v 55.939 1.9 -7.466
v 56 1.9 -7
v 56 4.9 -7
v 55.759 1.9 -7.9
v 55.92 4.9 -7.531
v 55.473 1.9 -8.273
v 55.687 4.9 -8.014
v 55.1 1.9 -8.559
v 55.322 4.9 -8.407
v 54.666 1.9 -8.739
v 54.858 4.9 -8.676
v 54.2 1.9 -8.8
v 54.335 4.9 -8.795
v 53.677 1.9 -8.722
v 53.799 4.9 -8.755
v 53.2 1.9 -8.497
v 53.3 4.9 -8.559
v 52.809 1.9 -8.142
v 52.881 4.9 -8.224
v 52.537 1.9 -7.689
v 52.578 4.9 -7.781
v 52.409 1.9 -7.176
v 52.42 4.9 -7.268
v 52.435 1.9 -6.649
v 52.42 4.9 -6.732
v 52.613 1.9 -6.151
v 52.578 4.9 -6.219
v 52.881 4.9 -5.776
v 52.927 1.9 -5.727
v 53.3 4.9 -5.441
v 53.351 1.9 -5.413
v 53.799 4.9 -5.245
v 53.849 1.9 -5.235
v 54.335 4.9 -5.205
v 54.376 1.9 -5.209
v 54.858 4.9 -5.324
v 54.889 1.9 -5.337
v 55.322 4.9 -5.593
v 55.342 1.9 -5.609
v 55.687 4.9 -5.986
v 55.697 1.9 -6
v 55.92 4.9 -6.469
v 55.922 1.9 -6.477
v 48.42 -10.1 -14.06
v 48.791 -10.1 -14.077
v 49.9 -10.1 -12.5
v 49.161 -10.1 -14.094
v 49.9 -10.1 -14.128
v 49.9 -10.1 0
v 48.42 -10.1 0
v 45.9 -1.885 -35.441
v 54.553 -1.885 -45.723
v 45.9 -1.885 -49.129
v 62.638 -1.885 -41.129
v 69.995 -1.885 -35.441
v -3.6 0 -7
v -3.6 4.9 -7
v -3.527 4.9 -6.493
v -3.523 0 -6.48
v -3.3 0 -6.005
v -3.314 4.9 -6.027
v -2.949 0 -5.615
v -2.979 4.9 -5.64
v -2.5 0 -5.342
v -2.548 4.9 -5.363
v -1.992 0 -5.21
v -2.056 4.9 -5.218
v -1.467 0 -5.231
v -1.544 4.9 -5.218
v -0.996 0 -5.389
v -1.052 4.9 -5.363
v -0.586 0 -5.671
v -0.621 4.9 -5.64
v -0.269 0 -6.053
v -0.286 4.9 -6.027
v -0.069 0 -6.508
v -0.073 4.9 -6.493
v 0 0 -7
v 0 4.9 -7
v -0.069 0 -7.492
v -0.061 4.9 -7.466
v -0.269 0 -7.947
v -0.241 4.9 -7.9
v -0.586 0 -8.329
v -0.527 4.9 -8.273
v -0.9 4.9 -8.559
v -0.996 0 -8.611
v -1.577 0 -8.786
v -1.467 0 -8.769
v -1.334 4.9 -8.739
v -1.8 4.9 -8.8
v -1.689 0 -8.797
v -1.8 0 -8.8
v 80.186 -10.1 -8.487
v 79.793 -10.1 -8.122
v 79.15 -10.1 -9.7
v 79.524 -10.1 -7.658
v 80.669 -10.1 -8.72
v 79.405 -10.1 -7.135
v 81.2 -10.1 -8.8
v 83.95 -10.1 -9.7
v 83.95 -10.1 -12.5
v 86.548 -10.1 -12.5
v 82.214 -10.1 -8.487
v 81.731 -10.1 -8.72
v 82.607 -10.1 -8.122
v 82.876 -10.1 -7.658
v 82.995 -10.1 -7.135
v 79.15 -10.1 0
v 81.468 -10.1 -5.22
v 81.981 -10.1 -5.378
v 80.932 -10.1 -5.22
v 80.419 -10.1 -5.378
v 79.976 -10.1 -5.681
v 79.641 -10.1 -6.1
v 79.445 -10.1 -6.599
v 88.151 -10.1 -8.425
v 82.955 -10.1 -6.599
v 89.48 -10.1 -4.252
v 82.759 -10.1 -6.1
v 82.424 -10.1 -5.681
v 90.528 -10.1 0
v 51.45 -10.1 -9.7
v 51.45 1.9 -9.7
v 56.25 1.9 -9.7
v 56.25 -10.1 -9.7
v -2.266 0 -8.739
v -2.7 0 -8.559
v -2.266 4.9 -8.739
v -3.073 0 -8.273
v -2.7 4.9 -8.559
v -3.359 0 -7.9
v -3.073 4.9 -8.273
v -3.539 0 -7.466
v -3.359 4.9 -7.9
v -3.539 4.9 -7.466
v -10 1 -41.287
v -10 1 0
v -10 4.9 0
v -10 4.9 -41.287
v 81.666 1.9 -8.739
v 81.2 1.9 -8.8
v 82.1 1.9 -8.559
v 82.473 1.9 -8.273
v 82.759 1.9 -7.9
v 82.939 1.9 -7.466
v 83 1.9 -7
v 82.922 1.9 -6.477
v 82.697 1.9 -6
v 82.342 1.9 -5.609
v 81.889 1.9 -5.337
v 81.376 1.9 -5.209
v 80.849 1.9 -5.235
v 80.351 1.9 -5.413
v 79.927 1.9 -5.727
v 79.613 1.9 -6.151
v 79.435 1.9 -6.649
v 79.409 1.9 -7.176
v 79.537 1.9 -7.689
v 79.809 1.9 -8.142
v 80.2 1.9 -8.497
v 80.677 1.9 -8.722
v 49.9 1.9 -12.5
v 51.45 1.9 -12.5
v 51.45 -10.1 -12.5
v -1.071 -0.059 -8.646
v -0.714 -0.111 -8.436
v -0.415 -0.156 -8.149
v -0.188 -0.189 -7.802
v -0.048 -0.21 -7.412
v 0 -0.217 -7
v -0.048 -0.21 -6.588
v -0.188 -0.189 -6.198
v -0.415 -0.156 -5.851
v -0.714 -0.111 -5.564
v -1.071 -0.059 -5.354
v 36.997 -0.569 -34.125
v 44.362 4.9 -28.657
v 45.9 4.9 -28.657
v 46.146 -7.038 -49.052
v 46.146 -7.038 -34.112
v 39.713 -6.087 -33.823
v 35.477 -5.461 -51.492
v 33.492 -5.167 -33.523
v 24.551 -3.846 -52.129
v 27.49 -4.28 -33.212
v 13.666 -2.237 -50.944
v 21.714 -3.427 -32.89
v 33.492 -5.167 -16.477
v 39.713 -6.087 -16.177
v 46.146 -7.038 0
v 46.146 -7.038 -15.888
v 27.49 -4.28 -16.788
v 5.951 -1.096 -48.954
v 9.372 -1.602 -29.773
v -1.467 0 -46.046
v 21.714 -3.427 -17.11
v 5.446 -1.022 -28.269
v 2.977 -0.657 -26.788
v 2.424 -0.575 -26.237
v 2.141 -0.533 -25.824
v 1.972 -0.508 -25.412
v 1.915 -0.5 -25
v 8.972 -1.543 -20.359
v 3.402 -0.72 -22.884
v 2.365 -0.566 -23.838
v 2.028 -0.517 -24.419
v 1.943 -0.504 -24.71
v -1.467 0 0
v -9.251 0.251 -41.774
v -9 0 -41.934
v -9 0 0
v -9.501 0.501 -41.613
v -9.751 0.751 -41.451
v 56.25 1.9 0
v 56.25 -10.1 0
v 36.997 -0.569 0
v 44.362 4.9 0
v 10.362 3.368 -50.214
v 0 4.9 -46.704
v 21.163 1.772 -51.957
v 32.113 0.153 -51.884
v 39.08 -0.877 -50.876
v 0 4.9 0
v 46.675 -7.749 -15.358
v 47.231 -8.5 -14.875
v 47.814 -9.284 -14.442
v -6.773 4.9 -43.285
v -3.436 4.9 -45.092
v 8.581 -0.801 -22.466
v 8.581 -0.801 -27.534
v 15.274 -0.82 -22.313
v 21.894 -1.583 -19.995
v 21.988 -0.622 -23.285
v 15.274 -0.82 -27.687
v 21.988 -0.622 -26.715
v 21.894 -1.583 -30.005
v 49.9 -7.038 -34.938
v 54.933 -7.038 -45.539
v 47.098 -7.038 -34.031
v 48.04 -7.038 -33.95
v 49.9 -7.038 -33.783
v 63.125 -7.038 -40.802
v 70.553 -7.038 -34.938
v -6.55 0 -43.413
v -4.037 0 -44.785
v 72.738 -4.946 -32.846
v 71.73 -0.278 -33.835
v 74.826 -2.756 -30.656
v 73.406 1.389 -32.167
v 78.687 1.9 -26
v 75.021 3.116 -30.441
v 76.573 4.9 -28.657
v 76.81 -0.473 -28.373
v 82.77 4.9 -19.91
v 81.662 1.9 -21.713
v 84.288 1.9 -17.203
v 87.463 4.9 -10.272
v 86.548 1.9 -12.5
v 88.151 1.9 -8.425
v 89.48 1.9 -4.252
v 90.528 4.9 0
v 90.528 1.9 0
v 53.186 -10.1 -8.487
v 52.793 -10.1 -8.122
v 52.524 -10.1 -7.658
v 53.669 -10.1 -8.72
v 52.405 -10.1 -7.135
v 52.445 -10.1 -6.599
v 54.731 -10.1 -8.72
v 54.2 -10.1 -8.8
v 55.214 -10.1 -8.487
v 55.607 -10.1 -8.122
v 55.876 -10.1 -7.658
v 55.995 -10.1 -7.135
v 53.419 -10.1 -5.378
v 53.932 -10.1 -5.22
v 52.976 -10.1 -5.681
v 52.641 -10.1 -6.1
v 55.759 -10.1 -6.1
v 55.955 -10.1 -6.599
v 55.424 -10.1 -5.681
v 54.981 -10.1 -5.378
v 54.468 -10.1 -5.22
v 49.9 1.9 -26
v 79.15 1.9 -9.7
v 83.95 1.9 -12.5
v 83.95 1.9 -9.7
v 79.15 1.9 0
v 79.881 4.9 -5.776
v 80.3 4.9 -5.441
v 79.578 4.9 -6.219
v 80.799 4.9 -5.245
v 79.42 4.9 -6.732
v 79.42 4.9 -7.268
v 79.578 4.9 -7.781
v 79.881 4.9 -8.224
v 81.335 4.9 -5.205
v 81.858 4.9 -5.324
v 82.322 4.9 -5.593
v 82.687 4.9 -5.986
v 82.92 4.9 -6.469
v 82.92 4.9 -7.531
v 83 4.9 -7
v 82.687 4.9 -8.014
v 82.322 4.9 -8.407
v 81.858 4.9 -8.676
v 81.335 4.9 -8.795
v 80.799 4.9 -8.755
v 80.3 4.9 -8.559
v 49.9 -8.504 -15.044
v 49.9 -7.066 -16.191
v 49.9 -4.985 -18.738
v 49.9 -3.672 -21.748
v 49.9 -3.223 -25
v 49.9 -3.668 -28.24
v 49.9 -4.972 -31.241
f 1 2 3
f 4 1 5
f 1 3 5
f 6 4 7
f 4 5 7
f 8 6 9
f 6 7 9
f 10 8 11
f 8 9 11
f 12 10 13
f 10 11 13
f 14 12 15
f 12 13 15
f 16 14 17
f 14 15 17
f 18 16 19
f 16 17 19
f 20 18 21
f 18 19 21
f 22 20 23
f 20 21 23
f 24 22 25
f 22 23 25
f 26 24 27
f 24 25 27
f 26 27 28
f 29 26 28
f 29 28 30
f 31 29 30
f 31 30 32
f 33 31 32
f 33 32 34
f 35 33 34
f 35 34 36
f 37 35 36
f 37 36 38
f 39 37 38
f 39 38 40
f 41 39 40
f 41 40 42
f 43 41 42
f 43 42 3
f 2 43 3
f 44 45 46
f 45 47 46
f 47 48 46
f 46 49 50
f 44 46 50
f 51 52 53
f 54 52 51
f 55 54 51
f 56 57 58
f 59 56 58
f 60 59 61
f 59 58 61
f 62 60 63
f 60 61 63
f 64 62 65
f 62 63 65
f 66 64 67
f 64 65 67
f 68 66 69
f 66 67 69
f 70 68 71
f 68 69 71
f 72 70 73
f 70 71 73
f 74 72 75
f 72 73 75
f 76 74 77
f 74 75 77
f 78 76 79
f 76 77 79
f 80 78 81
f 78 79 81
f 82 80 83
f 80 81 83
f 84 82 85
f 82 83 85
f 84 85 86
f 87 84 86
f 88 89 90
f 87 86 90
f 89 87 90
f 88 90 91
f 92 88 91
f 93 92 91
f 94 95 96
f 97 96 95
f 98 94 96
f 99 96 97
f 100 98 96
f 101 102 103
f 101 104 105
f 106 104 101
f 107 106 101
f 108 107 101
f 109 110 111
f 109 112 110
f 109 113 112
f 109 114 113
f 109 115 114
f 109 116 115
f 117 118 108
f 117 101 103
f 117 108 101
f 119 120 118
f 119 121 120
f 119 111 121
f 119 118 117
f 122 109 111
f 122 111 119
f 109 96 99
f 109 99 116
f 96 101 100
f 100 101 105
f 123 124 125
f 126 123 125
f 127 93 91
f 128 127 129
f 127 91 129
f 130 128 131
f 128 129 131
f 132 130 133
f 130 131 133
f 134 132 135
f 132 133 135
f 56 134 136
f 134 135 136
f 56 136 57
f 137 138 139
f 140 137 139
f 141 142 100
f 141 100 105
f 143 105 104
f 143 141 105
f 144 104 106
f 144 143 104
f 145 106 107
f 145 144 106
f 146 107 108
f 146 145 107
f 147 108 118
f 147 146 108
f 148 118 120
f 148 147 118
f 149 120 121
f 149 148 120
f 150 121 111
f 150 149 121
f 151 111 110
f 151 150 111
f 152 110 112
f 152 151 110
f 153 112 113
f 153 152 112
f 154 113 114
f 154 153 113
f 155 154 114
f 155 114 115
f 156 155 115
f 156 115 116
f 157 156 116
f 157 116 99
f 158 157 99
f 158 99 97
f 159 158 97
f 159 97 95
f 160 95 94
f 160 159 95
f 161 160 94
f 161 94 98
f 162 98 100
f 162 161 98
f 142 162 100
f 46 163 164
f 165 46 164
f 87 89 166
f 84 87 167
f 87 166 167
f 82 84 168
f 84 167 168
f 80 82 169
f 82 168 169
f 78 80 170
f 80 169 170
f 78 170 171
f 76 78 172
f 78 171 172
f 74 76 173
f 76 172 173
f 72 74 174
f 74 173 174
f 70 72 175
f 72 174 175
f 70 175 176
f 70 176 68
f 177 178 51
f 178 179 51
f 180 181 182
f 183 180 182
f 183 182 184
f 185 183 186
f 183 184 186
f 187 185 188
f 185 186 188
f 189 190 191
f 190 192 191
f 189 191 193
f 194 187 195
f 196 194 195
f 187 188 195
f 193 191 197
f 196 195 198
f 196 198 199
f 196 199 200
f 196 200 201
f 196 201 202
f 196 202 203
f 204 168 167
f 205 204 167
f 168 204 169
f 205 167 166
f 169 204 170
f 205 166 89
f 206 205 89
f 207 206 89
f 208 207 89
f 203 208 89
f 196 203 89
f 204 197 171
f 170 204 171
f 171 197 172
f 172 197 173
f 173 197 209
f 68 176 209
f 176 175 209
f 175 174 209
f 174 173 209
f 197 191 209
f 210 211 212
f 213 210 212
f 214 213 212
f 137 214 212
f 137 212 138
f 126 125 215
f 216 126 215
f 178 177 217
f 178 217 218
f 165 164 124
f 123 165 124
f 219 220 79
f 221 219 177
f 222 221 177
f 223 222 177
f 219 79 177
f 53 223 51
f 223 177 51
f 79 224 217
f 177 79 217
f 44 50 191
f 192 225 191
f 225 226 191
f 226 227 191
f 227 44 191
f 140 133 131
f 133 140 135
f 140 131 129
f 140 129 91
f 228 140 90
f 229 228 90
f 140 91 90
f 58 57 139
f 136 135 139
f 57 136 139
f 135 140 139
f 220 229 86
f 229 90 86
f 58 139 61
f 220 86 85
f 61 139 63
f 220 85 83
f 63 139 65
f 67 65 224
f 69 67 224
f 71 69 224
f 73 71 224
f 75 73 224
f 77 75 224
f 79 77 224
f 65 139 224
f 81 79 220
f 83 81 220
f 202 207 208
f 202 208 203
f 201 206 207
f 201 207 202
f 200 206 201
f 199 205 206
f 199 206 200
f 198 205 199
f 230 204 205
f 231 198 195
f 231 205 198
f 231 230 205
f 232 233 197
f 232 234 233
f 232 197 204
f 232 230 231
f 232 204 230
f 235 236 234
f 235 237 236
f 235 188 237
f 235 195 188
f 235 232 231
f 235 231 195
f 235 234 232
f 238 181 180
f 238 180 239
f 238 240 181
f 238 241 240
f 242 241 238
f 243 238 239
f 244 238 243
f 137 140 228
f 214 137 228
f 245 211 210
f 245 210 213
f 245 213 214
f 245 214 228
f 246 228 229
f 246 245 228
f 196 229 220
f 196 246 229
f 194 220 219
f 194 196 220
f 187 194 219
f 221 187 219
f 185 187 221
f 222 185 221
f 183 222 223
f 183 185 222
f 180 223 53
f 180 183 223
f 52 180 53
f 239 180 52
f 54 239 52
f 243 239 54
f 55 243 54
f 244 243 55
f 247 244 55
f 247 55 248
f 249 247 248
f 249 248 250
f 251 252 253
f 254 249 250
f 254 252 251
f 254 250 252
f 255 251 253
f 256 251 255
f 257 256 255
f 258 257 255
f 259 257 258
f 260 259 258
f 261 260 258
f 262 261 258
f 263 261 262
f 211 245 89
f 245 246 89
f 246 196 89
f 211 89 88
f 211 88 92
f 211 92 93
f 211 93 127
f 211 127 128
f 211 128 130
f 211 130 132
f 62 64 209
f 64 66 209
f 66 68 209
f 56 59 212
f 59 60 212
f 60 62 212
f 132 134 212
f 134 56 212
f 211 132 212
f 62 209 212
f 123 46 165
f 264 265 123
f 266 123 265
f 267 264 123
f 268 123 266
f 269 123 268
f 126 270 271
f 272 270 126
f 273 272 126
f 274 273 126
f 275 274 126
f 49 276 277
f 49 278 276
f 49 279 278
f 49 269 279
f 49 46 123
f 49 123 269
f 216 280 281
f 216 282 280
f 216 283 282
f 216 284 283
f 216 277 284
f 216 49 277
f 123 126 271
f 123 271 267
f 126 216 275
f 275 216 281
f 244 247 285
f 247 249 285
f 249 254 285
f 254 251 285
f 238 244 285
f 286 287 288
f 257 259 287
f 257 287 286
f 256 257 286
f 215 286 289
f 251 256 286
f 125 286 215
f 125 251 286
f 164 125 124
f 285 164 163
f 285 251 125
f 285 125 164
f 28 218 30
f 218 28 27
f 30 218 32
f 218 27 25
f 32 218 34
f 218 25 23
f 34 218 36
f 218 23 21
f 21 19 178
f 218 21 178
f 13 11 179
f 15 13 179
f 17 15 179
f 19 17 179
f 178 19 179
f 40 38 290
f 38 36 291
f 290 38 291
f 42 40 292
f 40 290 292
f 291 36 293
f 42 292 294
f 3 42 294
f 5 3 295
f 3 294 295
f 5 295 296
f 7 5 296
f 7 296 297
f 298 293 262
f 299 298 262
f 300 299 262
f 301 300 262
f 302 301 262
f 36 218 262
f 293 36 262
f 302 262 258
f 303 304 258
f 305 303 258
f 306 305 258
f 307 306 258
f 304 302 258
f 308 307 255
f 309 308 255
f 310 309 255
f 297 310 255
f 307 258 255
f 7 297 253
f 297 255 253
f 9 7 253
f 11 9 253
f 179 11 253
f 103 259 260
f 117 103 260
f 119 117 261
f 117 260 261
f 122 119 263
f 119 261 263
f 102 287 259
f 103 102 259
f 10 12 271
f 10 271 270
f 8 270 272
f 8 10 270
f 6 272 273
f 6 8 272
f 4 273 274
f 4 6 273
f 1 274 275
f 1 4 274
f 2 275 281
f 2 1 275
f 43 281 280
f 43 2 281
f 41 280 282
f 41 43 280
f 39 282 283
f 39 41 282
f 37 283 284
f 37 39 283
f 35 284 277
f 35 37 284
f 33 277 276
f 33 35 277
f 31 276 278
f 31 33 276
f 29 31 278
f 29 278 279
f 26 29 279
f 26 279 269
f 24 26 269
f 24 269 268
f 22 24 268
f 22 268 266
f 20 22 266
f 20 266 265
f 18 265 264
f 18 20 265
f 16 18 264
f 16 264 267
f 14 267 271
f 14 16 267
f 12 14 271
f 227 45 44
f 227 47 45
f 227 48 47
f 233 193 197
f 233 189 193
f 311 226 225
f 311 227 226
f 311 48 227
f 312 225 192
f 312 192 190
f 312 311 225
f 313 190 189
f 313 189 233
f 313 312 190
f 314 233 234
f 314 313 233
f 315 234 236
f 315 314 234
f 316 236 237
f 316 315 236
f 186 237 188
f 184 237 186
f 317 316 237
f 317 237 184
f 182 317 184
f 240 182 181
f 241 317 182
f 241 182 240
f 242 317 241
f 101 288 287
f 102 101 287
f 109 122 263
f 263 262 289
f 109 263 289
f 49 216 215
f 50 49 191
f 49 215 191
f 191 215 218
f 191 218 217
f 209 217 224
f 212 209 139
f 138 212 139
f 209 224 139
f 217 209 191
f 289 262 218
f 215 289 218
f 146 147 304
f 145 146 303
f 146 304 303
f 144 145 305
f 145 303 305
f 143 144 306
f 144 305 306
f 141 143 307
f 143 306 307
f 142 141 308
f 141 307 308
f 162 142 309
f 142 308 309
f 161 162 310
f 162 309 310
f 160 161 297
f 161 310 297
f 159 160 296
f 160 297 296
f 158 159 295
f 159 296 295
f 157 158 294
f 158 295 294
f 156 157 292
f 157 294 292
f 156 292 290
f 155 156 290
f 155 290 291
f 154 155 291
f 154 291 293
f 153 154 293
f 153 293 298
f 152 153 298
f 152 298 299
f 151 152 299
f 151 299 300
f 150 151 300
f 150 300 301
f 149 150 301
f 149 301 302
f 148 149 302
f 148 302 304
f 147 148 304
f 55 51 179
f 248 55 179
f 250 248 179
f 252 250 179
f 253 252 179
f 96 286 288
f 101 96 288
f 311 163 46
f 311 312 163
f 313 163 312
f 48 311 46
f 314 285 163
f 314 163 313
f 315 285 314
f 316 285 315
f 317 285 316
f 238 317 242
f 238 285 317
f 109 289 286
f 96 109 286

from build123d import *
from build123d.topology import SkipClean

# Parameters (mm, degrees)
SKETCH1_W            = 10
SKETCH1_H            = 10
BOSS_EXTRUDE1_DEPTH  = 4.9
CHAMFER1_SIZE        = 1
BOSS_EXTRUDE2_DEPTH  = 16
BOSS_EXTRUDE3_DEPTH  = 10
BOSS_EXTRUDE4_DEPTH  = 13
CHAMFER2_SIZE        = 12
BOSS_EXTRUDE5_DEPTH  = 30
CUT_EXTRUDE2_REACH   = 128.798
CUT_EXTRUDE1_START   = -15
CUT_EXTRUDE1_DEPTH   = 15
M3_CLEARANCE_HOLE1_D = 3.6
SKETCH11_W           = 1.8
SKETCH11_H           = 4.9
CHAMFER3_SIZE        = 9
CHAMFER3_SIZE_2      = 7.926193673
SKETCH14_R           = 1.8
BOSS_EXTRUDE6_DEPTH  = 12
M3_CLEARANCE_HOLE3_D = 3.6
SKETCH19_W           = 25
SKETCH19_H           = 20
CUT_EXTRUDE3_DEPTH   = 3.062116


# Read off the part's stored shape, not the designer's step: Cut-Extrude1
# Some blends are built 0.0001 mm under size
with BuildPart() as part:
    # Sketch1 → Boss-Extrude1 (new body)
    with BuildSketch(Plane(origin=(0, 0, 0), x_dir=(1, 0, 0), z_dir=(0, 1, 0))):
        with Locations((-5, 5)):
            Rectangle(SKETCH1_W, SKETCH1_H)
    extrude(amount=BOSS_EXTRUDE1_DEPTH)

    # Chamfer1
    chamfer1_edges = [part.edges().sort_by_distance(p)[0] for p in [
        (-10, 0, -5),
    ]]
    chamfer(chamfer1_edges, length=CHAMFER1_SIZE)

    # Sketch2 → Boss-Extrude2 (add)
    with BuildSketch(Plane(origin=(0, 0, -10), x_dir=(-1, 0, 0), z_dir=(0, 0, -1))):
        Polygon((-49.9, -10.1), (-48.419662682, -10.1), (-46.146212445, -7.037883957), (1.467233005, 0), (9, 0), (10, 1), (10, 4.9), (0, 4.9), (-45.9, -1.884614526), (-45.9, 4.9), (-95.9, 4.9), (-95.9, 1.9), (-49.9, 1.9), align=None)
    extrude(amount=BOSS_EXTRUDE2_DEPTH)

    # Sketch2<4> → Boss-Extrude3 (add)
    with BuildSketch(Plane(origin=(0, 0, -10), x_dir=(-1, 0, 0), z_dir=(0, 0, -1))):
        Polygon((-49.9, -10.1), (-48.419662682, -10.1), (-46.146212445, -7.037883957), (1.467233005, 0), (0, 0), (0, 4.9), (-45.9, -1.884614526), (-45.9, 4.9), (-95.9, 4.9), (-95.9, 1.9), (-49.9, 1.9), align=None)
    extrude(amount=-BOSS_EXTRUDE3_DEPTH)

    # Sketch3 → Boss-Extrude4 (add)
    with BuildSketch(Plane(origin=(0, 0, -26), x_dir=(-1, 0, 0), z_dir=(0, 0, -1))):
        Polygon((-95.9, 1.9), (-95.9, -10.1), (-49.9, -10.1), (-48.419662682, -10.1), (-46.146212445, -7.037883957), (1.467233005, 0), (9, 0), (10, 1), (10, 4.9), (0, 4.9), (-45.9, -1.884614526), (-45.9, 4.9), (-95.9, 4.9), align=None)
    extrude(amount=BOSS_EXTRUDE4_DEPTH)

    # Chamfer2
    chamfer2_edges = [part.edges().sort_by_distance(p)[0] for p in [
        (72.9, -10.1, -26),
    ]]
    chamfer(chamfer2_edges, length=CHAMFER2_SIZE - 0.0001)  # a hair under: the kernel refuses the full size

    # Sketch4 → Boss-Extrude5 (add)
    with BuildSketch(Plane(origin=(0, 0, -39), x_dir=(-1, 0, 0), z_dir=(0, 0, -1))):
        Polygon((-95.9, 4.9), (-95.9, -10.1), (-48.419662682, -10.1), (-46.146212445, -7.037883957), (1.467233005, 0), (9, 0), (10, 1), (10, 4.9), (0, 4.9), (-45.9, -1.884614526), (-45.9, 4.9), align=None)
    extrude(amount=BOSS_EXTRUDE5_DEPTH)

    # Sketch15 → Cut-Extrude2 (cut, up to next)
    with BuildSketch(Plane(origin=(95.9, 0, 0), x_dir=(0, 0, -1), z_dir=(1, 0, 0)), mode=Mode.PRIVATE) as cut_extrude2_sk1:
        Polygon((69, -1.884614526), (35.441468776, -1.884614526), (28.656854249, 4.9), (69, 4.9), align=None)
    cut_extrude2_tool1 = extrude(cut_extrude2_sk1.sketch, amount=-CUT_EXTRUDE2_REACH, mode=Mode.PRIVATE) & part.part
    add(cut_extrude2_tool1.solids().sort_by_distance((95.9, 1.611504, -50.472675))[0], mode=Mode.SUBTRACT)

    # Cut-Extrude1 outline → Cut-Extrude1 (cut)
    with BuildSketch(Plane(origin=(0, 4.9, 0), x_dir=(1, 0, 0), z_dir=(0, 1, 0)).offset(CUT_EXTRUDE1_START)):
        with BuildLine():
            ThreePointArc((-10, 41.287361933), (51.179168383, 47.220256879), (90.528084846, 0))
            Line((90.528084846, 0), (95.9, 0))
            Line((95.9, 0), (95.9, 69))
            Line((95.9, 69), (-10, 69))
            Line((-10, 69), (-10, 41.287361933))
        make_face()
    extrude(amount=CUT_EXTRUDE1_DEPTH, mode=Mode.SUBTRACT)

    # M3 Clearance Hole1 (through all)
    with Locations(Plane(origin=(0, 1.9, 0), x_dir=(-1, 0, 0), z_dir=(0, -1, 0))):
        with Locations((-81.2, 7), (-54.2, 7)):
            Hole(M3_CLEARANCE_HOLE1_D / 2)

    # Sketch11 → M3 Clearance Hole2 (revolve, cut)
    with BuildSketch(Plane(origin=(-1.8, 0, -7), x_dir=(0, 0, -1), z_dir=(1, 0, 0))):
        with Locations((0.9, 2.45)):
            Rectangle(SKETCH11_W, SKETCH11_H)
    revolve(axis=Axis((-1.8, -6.35, -7), (0, 1, 0)), mode=Mode.SUBTRACT)

    # Chamfer3
    # the kernel refuses this chamfer: 9, 7.926193673 mm, written as the material it adds along each edge
    with BuildSketch(Plane(origin=(45.9, -1.884614526, -35.441468776), x_dir=(-0.9928980217571691, 0.11896856051369163, 0), z_dir=(0, 0, 1))) as chamfer3_piece_1_section:
        Polygon((CHAMFER3_SIZE * 0.999621916911, -CHAMFER3_SIZE * 0.0274958766106), (CHAMFER3_SIZE_2 * 0.118968560518, -CHAMFER3_SIZE_2 * 0.992898021792), (0, 0), align=None)
    chamfer3_piece_1 = extrude(amount=35.441468776, mode=Mode.PRIVATE)
    chamfer3_piece_1 = split(chamfer3_piece_1, bisect_by=Plane(origin=(42.836377778, 4.9, -16.273200987), z_dir=(0, -1, 0)), keep=Keep.TOP, mode=Mode.PRIVATE)
    chamfer3_piece_1 = split(chamfer3_piece_1, bisect_by=Plane(origin=(42.836377778, 9.147052769, -24.40980148), z_dir=(6.542051911182403e-15, -0.7071067811865479, 0.7071067811865472)), keep=Keep.TOP, mode=Mode.PRIVATE)
    add(chamfer3_piece_1)

    # Sketch12 → Cut-Revolve1 (revolve, cut)
    with BuildSketch(Plane.XY.offset(-25)):
        Polygon((0, -0.5), (22, -0.5), (92, -7.331568331), (90.828874, -19.331568331), (0, -10.467230343), align=None)
    revolve(axis=Axis((90.828874, -19.331568331, -25), (-0.9952714730097288, 0.09713235821828223, 0)), mode=Mode.SUBTRACT)

    # Sketch14 → Boss-Extrude6 (add)
    # profile 1 of 2: a face of its own
    with SkipClean():  # the faces are left unmerged after this step: merging them gives an invalid solid
        with BuildSketch(Plane.XZ.offset(-1.9)):
            with BuildLine():
                Line((83.95, -12.5), (86.547763007, -12.5))
                ThreePointArc((86.547763007, -12.5), (88.850452987, -6.3495173), (90.528084846, 0))
                Line((90.528084846, 0), (79.15, 0))
                Line((79.15, 0), (79.15, -9.7))
                Line((79.15, -9.7), (83.95, -9.7))
                Line((83.95, -9.7), (83.95, -12.5))
            make_face()
            with Locations(Location((81.2, -7, 0), (0, 0, 270))):
                Circle(SKETCH14_R, mode=Mode.SUBTRACT)
        # profile 2 of 2: a face of its own
        with BuildSketch(Plane.XZ.offset(-1.9)):
            Polygon((49.9, 0), (49.9, -12.5), (51.45, -12.5), (51.45, -9.7), (56.25, -9.7), (56.25, 0), align=None)
            with Locations(Location((54.2, -7, 0), (0, 0, 270))):
                Circle(SKETCH14_R, mode=Mode.SUBTRACT)
        extrude(amount=BOSS_EXTRUDE6_DEPTH)
    add(part.part.scale(1), mode=Mode.REPLACE)  # the faces are merged on a copy

    # M3 Clearance Hole3 (through all)
    with Locations(Plane(origin=(0, 4.9, 0), x_dir=(1, 0, 0), z_dir=(0, 1, 0))):
        with Locations((-1.8, 7)):
            Hole(M3_CLEARANCE_HOLE3_D / 2)

    # Sketch19 → Cut-Extrude3 (cut)
    with BuildSketch(Plane.XZ.offset(10.1)):
        with Locations((58.646212445, -40)):
            Rectangle(SKETCH19_W, SKETCH19_H)
    extrude(amount=-CUT_EXTRUDE3_DEPTH, mode=Mode.SUBTRACT)


solid = part.part
